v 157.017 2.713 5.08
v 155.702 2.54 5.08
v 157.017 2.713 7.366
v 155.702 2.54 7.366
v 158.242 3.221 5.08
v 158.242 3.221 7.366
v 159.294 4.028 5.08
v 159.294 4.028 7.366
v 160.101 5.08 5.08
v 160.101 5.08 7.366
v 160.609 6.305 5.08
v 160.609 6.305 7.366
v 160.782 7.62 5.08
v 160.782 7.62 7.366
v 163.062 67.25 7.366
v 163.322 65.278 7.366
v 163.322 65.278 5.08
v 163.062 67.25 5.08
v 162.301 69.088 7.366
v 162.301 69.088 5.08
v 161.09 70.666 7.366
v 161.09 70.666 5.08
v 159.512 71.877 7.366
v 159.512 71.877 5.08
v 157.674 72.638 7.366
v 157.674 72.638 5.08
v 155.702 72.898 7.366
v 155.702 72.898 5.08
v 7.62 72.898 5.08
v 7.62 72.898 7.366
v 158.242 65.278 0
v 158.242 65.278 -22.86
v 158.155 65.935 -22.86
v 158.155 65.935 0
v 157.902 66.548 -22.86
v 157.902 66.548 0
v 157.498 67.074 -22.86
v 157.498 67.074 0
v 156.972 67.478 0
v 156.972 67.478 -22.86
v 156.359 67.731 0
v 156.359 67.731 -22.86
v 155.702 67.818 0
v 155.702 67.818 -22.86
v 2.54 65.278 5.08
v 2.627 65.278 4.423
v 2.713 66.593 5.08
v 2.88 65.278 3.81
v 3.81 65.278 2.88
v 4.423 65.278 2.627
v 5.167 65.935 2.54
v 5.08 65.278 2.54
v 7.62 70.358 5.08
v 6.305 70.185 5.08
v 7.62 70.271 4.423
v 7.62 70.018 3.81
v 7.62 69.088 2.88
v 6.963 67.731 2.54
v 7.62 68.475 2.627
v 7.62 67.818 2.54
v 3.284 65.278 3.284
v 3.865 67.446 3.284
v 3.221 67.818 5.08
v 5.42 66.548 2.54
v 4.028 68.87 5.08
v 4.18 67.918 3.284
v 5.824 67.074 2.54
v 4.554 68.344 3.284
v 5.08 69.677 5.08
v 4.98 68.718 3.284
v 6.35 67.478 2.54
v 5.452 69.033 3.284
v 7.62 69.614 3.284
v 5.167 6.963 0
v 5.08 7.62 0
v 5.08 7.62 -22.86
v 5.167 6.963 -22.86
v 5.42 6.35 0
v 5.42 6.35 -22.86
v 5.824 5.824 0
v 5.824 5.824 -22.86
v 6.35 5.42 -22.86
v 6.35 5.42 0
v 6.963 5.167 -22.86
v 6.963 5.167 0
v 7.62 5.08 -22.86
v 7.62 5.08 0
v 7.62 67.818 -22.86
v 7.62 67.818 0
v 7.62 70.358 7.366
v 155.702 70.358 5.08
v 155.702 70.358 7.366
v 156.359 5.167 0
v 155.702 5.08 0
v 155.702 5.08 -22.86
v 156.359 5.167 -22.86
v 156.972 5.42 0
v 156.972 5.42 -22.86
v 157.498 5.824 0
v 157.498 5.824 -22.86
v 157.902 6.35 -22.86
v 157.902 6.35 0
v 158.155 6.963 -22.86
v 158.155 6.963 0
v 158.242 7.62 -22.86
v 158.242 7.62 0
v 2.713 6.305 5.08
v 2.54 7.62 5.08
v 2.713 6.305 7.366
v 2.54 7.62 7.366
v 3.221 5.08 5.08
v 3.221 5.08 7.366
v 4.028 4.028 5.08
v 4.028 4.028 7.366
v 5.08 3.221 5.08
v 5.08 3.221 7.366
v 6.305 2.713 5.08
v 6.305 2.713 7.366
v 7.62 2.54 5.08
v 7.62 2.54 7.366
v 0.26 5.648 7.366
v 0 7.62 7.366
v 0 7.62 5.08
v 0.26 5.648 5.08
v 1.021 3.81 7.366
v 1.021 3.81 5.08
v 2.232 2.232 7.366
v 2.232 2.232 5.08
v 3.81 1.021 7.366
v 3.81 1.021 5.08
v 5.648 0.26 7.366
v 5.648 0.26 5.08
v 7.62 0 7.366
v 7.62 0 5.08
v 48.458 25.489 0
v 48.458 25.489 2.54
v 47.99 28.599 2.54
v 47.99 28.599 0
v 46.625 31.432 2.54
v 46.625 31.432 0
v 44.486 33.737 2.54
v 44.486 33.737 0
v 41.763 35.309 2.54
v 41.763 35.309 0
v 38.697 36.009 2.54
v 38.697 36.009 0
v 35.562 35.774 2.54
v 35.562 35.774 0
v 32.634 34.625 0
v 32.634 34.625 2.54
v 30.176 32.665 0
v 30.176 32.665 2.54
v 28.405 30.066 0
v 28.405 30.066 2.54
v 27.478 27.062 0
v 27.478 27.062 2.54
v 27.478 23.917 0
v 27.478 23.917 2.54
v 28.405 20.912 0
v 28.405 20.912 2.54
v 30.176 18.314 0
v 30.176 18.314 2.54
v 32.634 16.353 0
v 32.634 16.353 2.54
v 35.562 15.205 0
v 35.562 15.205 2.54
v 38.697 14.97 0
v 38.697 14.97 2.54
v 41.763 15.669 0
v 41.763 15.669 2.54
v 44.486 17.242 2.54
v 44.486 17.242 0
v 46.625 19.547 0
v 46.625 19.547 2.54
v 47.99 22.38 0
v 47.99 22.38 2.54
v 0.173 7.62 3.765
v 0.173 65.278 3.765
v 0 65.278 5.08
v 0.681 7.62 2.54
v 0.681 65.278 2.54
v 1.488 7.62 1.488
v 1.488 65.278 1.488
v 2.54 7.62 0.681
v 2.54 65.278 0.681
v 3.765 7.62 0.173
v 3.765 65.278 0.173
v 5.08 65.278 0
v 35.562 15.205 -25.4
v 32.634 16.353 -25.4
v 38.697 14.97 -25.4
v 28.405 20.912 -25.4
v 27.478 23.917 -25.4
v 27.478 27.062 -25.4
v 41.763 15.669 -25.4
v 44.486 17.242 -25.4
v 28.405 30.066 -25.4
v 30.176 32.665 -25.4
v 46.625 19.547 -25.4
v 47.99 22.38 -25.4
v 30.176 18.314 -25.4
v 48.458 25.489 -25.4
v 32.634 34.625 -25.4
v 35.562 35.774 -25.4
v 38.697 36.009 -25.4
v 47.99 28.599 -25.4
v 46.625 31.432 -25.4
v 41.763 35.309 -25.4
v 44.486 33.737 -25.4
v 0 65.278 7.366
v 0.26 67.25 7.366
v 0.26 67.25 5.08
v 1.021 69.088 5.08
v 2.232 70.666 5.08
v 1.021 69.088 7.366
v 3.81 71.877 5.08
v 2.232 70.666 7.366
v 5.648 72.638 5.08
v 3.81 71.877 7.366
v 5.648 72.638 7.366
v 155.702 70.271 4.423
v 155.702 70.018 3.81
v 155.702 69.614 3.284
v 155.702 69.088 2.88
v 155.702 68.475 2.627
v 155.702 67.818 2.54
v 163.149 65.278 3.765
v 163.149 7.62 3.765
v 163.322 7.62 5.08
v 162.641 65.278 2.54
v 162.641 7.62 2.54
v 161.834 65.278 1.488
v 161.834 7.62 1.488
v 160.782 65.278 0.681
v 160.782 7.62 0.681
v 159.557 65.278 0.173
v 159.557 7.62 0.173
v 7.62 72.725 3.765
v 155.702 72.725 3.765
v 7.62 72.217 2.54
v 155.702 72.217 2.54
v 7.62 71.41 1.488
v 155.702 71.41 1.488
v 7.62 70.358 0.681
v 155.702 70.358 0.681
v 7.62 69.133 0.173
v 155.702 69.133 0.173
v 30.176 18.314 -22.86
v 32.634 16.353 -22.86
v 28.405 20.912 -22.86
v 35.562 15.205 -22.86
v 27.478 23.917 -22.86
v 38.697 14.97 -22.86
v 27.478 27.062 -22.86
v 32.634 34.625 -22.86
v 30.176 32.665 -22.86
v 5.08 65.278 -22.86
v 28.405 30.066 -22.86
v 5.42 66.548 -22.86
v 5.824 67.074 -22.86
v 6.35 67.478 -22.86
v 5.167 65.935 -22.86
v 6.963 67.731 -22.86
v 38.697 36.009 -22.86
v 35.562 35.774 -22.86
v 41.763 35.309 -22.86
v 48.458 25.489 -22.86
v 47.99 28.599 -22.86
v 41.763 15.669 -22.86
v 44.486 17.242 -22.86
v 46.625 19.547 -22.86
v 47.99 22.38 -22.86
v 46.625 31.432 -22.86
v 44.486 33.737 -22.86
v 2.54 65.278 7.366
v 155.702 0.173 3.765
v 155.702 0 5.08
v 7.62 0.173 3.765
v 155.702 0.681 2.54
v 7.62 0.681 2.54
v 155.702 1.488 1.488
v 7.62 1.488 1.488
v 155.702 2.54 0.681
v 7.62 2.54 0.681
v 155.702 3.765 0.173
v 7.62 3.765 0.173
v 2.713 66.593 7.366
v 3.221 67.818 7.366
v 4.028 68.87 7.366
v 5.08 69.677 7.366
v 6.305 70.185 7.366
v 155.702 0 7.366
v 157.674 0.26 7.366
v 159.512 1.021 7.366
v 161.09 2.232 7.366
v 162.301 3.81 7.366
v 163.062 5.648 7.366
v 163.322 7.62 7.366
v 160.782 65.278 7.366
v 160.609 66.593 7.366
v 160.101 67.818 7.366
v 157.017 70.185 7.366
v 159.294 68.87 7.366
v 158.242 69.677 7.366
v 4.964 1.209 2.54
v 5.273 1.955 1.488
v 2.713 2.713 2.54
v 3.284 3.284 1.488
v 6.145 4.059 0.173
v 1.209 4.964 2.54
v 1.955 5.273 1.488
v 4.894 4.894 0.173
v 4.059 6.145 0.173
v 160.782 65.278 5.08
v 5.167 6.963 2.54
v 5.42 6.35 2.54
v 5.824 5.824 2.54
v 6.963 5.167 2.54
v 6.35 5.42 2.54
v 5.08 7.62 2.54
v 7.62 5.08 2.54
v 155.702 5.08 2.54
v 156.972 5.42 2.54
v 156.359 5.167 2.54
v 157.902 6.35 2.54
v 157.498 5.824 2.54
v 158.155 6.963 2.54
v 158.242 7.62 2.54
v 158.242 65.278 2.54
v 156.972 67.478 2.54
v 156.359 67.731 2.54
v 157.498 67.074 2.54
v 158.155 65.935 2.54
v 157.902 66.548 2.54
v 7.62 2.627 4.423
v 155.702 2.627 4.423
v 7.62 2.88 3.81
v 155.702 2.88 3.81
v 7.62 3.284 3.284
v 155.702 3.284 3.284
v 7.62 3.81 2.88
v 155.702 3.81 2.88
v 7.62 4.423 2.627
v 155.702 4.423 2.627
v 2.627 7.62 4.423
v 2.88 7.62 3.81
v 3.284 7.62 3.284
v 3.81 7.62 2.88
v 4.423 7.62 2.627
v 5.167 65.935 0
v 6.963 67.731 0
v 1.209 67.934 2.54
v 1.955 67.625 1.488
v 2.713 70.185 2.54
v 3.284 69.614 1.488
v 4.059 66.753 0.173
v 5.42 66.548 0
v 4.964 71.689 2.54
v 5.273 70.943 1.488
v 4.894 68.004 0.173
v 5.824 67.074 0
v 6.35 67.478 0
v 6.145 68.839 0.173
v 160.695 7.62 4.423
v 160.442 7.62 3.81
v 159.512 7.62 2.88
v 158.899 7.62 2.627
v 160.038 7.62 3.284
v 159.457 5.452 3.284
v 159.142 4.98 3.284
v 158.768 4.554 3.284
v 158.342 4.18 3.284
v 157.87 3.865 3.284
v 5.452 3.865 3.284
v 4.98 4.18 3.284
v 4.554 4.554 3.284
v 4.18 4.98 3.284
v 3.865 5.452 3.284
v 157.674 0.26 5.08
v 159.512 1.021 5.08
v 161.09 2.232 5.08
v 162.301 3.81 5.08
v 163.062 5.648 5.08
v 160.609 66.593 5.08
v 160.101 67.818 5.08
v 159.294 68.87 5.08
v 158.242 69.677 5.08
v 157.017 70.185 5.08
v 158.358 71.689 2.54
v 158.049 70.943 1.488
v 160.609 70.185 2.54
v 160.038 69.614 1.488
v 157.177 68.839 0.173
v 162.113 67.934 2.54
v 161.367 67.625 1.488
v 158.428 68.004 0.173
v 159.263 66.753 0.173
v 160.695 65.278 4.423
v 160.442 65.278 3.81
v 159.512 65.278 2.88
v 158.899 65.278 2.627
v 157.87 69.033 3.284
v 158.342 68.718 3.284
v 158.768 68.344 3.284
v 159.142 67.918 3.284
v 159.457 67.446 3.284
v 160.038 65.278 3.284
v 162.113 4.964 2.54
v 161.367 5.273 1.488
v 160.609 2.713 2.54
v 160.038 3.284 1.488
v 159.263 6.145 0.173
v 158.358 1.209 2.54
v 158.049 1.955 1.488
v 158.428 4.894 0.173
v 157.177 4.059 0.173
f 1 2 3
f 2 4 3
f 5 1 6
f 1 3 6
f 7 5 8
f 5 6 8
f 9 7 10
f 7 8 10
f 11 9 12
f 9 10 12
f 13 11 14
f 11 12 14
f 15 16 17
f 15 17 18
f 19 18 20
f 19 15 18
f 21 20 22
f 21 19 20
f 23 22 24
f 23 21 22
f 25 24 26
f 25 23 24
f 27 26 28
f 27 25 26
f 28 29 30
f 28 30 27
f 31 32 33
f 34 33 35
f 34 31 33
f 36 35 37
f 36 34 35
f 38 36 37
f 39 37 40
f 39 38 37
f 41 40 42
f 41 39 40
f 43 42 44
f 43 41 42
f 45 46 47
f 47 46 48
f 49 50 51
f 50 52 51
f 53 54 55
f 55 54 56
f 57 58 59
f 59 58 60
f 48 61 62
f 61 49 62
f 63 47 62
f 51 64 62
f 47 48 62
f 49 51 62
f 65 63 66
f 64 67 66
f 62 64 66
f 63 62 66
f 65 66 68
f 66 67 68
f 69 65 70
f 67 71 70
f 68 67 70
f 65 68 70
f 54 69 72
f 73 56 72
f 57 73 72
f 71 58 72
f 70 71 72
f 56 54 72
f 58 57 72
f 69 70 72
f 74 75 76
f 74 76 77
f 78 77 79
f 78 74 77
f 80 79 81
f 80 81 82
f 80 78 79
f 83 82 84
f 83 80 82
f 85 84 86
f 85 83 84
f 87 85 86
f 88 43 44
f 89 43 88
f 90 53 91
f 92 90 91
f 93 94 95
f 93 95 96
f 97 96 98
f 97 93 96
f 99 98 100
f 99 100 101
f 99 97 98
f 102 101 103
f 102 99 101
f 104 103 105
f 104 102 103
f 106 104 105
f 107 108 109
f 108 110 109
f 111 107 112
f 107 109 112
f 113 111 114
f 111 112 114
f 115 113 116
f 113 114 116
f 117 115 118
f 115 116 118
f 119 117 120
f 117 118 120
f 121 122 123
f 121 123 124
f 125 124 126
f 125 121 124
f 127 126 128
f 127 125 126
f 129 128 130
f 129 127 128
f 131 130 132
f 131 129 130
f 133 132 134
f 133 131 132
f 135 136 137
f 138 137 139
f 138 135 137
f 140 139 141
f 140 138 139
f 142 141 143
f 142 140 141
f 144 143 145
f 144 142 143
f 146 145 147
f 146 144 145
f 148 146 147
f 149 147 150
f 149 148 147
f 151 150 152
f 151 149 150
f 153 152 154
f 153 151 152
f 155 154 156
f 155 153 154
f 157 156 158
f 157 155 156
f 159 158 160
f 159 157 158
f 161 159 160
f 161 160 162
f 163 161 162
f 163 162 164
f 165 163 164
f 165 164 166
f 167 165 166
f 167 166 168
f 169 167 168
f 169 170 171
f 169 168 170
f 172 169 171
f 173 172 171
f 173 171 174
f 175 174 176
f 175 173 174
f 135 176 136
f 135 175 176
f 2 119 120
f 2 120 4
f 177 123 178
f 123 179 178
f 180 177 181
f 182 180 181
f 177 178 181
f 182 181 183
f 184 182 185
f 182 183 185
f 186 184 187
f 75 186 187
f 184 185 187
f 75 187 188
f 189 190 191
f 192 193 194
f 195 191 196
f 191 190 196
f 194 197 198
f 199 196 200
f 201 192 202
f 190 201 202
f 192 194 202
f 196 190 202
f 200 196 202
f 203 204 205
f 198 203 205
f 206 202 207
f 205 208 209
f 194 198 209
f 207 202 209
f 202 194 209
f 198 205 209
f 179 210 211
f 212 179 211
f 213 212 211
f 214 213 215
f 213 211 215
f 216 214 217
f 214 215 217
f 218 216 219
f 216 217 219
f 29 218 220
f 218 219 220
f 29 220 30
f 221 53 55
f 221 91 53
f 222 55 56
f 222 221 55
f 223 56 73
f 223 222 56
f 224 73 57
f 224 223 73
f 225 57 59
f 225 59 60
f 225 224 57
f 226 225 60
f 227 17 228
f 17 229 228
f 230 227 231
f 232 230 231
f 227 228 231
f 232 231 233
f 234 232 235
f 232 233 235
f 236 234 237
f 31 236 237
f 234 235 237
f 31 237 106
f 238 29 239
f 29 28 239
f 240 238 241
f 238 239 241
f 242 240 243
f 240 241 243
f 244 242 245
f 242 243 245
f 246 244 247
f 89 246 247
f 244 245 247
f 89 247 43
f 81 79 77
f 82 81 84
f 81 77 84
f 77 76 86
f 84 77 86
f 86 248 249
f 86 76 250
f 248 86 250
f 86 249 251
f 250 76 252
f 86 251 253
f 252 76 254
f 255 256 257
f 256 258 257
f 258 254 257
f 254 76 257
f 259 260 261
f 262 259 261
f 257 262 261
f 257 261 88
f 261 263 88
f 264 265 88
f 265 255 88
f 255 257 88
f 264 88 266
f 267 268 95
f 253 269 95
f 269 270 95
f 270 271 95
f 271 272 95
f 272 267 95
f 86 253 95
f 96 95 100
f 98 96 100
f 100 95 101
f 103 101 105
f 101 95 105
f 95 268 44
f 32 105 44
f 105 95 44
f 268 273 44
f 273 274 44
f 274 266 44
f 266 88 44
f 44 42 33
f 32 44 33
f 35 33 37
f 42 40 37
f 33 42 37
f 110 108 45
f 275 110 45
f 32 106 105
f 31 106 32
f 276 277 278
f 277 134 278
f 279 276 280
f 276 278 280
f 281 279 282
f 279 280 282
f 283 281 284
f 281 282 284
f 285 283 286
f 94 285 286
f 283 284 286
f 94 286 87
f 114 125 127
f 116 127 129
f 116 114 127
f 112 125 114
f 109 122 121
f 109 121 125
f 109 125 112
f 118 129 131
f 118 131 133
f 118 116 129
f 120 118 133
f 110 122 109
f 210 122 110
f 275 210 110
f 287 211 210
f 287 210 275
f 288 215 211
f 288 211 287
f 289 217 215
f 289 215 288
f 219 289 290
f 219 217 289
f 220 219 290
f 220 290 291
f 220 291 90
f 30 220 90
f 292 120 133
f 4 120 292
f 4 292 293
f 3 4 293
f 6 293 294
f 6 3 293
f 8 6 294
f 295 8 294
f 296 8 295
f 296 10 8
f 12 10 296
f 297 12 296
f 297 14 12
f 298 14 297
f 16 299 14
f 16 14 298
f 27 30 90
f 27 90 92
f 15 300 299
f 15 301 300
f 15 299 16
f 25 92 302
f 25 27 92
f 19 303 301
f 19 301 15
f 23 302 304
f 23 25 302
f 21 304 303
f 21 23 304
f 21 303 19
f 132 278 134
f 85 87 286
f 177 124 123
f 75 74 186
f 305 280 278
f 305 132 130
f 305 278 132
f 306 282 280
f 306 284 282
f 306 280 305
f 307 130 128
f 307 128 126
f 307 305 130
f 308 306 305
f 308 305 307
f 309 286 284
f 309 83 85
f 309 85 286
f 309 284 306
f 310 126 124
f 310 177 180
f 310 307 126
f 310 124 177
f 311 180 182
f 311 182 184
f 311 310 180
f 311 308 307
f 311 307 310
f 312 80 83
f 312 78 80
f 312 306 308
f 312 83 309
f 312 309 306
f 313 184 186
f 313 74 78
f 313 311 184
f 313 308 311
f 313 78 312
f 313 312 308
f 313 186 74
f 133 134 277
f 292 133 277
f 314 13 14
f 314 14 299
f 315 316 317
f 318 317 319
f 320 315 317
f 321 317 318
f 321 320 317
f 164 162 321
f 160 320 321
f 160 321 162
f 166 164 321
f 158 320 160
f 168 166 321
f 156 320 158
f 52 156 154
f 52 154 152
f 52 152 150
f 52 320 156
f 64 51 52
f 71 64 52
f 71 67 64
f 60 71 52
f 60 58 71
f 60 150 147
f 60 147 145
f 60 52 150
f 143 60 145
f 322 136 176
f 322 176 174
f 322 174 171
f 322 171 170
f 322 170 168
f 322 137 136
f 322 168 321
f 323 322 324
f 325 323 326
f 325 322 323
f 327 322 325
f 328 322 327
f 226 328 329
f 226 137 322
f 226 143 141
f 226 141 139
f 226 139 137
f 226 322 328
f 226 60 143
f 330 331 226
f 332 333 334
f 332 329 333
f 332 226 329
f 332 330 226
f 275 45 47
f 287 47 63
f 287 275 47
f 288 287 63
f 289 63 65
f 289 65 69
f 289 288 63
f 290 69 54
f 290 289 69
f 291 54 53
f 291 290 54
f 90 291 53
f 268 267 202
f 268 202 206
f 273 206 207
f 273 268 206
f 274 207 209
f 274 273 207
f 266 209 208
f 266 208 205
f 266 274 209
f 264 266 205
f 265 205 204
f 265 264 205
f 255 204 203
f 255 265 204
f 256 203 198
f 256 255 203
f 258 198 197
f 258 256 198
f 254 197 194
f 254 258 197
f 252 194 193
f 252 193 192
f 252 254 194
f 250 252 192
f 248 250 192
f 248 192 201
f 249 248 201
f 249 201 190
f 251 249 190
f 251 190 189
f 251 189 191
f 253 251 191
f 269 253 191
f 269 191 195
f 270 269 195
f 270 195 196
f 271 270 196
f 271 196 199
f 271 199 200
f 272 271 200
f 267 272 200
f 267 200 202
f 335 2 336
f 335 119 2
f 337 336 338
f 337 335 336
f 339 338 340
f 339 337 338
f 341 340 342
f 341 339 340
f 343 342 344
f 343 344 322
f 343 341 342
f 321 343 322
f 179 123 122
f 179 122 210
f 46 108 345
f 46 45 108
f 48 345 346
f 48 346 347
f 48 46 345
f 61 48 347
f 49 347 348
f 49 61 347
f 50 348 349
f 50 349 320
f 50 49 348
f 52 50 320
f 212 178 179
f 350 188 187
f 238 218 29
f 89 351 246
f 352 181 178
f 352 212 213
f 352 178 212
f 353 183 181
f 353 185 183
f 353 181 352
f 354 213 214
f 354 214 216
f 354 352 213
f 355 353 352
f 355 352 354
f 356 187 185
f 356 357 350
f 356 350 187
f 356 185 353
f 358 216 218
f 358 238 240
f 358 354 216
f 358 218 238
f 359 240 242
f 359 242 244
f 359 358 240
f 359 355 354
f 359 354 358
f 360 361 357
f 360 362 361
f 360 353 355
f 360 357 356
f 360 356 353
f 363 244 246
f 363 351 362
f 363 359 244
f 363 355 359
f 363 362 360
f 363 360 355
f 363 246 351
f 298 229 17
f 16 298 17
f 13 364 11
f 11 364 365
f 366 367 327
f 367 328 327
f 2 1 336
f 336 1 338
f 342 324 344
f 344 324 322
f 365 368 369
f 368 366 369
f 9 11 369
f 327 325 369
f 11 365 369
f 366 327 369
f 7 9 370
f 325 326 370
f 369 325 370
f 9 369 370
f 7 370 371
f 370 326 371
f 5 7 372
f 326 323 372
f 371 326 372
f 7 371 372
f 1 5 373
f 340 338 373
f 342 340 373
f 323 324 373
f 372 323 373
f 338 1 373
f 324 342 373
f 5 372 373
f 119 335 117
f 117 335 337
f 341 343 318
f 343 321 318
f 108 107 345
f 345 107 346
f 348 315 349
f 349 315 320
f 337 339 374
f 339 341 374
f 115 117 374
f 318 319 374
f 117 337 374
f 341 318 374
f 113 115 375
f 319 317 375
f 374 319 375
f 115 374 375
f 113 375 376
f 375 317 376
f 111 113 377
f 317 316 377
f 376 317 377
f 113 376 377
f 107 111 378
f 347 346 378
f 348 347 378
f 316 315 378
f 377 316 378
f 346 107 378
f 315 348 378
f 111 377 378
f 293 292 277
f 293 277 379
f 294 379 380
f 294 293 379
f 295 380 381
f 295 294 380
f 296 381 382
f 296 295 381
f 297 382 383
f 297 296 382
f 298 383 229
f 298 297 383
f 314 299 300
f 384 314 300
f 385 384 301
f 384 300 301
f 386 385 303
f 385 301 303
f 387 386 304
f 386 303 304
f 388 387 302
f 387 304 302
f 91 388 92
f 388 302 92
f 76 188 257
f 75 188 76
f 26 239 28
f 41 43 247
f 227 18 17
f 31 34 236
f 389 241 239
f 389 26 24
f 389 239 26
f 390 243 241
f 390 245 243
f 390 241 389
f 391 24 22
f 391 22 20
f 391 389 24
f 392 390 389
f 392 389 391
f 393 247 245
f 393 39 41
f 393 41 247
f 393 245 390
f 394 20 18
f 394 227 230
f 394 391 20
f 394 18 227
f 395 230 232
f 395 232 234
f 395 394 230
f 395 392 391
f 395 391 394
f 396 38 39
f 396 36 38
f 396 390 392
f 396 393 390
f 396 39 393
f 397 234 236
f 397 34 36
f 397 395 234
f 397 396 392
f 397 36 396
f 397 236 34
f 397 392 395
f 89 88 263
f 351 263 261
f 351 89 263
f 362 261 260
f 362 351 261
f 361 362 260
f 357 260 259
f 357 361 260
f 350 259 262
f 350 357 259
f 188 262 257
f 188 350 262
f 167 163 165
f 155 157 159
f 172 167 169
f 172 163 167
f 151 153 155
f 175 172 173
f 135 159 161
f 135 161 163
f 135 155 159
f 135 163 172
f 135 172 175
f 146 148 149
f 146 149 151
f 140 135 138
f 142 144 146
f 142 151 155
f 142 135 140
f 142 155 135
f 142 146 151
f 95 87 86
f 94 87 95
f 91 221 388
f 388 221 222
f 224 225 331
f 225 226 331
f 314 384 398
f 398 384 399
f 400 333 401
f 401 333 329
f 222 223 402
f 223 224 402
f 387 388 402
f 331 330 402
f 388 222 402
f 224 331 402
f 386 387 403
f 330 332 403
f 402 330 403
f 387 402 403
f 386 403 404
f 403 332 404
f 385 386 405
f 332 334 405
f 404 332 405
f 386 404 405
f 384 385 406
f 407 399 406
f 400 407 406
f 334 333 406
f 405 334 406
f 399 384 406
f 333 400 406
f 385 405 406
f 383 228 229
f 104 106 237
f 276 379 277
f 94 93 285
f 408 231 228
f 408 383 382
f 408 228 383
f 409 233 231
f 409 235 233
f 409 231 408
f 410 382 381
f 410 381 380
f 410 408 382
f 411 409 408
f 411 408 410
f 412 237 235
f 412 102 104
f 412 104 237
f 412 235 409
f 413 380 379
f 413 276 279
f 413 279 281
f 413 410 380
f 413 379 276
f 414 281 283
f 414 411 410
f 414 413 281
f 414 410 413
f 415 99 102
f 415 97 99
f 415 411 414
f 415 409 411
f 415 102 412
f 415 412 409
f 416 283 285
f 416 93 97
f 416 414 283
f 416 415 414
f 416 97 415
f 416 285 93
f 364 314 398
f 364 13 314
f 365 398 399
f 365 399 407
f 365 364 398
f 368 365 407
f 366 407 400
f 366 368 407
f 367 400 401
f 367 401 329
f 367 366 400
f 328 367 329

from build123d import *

# Parameters (mm, degrees)
F0_W      = 163.322
F0_H      = 72.898
F1_DEPTH  = 7.366
F2_R      = 7.62
F3_R      = 5.08
F4_T      = -2.54
F5_R      = 10.5491920508
F6_DEPTH  = 30.48
F4_FACE_R = 10.5491920508
F7_DEPTH  = 25.4


with BuildPart() as f1:
    # F0 (on Top) → F1 (new body)
    with BuildSketch(Plane.XY):
        with Locations((81.661, 36.449)):
            Rectangle(F0_W, F0_H)
    extrude(amount=F1_DEPTH)

    # F2
    f2_edges = [f1.edges().sort_by_distance(p)[0] for p in [
        (163.322, 72.898, 3.683),
        (0, 72.898, 3.683),
        (163.322, 0, 3.683),
        (0, 0, 3.683),
    ]]
    fillet(f2_edges, radius=F2_R)

    # F3
    f3_edges = [f1.edges().sort_by_distance(p)[0] for p in [
        (0, 36.449, 0),
        (2.231846, 70.666154, 0),
        (2.231846, 2.231846, 0),
        (81.661, 72.898, 0),
        (81.661, 0, 0),
        (161.090154, 70.666154, 0),
        (161.090154, 2.231846, 0),
        (163.322, 36.449, 0),
    ]]
    fillet(f3_edges, radius=F3_R)

    # F4
    f4_openings = [f1.faces().sort_by_distance(p)[0] for p in [
        (81.661, 36.449, 7.366),
    ]]
    offset(amount=F4_T, openings=f4_openings)

    # F5 (on Top) → F6 (cut)
    with BuildSketch(Plane.XY):
        with Locations((37.9090681672, 25.489339605)):
            Circle(F5_R)
    extrude(amount=F6_DEPTH, mode=Mode.SUBTRACT)

    # F5 (on Top) + F4_face (on face) → F7 (join)
    with BuildSketch(Plane.XY):
        with Locations((37.9090681672, 25.489339605)):
            Circle(F5_R)
    with BuildSketch(Plane(origin=(83.3139491245, 36.8630562553, 2.54), x_dir=(1, 0, 0), z_dir=(0, 0, 1))):
        with BuildLine():
            Line((-78.2339491245, 28.4149437447), (-78.2339491245, -29.2430562553))
            ThreePointArc((-78.2339491245, -29.2430562553), (-77.4900003487, -31.0391074795), (-75.6939491245, -31.7830562553))
            Line((-75.6939491245, -31.7830562553), (72.3880508755, -31.7830562553))
            ThreePointArc((72.3880508755, -31.7830562553), (74.1841020997, -31.0391074795), (74.9280508755, -29.2430562553))
            Line((74.9280508755, -29.2430562553), (74.9280508755, 28.4149437447))
            ThreePointArc((74.9280508755, 28.4149437447), (74.1841020997, 30.210994969), (72.3880508755, 30.9549437447))
            Line((72.3880508755, 30.9549437447), (-75.6939491245, 30.9549437447))
            ThreePointArc((-75.6939491245, 30.9549437447), (-77.4900003487, 30.210994969), (-78.2339491245, 28.4149437447))
        make_face()
        with Locations((-45.4048809573, -11.3737166503)):
            Circle(F4_FACE_R, mode=Mode.SUBTRACT)
    extrude(amount=-F7_DEPTH)


solid = f1.part
